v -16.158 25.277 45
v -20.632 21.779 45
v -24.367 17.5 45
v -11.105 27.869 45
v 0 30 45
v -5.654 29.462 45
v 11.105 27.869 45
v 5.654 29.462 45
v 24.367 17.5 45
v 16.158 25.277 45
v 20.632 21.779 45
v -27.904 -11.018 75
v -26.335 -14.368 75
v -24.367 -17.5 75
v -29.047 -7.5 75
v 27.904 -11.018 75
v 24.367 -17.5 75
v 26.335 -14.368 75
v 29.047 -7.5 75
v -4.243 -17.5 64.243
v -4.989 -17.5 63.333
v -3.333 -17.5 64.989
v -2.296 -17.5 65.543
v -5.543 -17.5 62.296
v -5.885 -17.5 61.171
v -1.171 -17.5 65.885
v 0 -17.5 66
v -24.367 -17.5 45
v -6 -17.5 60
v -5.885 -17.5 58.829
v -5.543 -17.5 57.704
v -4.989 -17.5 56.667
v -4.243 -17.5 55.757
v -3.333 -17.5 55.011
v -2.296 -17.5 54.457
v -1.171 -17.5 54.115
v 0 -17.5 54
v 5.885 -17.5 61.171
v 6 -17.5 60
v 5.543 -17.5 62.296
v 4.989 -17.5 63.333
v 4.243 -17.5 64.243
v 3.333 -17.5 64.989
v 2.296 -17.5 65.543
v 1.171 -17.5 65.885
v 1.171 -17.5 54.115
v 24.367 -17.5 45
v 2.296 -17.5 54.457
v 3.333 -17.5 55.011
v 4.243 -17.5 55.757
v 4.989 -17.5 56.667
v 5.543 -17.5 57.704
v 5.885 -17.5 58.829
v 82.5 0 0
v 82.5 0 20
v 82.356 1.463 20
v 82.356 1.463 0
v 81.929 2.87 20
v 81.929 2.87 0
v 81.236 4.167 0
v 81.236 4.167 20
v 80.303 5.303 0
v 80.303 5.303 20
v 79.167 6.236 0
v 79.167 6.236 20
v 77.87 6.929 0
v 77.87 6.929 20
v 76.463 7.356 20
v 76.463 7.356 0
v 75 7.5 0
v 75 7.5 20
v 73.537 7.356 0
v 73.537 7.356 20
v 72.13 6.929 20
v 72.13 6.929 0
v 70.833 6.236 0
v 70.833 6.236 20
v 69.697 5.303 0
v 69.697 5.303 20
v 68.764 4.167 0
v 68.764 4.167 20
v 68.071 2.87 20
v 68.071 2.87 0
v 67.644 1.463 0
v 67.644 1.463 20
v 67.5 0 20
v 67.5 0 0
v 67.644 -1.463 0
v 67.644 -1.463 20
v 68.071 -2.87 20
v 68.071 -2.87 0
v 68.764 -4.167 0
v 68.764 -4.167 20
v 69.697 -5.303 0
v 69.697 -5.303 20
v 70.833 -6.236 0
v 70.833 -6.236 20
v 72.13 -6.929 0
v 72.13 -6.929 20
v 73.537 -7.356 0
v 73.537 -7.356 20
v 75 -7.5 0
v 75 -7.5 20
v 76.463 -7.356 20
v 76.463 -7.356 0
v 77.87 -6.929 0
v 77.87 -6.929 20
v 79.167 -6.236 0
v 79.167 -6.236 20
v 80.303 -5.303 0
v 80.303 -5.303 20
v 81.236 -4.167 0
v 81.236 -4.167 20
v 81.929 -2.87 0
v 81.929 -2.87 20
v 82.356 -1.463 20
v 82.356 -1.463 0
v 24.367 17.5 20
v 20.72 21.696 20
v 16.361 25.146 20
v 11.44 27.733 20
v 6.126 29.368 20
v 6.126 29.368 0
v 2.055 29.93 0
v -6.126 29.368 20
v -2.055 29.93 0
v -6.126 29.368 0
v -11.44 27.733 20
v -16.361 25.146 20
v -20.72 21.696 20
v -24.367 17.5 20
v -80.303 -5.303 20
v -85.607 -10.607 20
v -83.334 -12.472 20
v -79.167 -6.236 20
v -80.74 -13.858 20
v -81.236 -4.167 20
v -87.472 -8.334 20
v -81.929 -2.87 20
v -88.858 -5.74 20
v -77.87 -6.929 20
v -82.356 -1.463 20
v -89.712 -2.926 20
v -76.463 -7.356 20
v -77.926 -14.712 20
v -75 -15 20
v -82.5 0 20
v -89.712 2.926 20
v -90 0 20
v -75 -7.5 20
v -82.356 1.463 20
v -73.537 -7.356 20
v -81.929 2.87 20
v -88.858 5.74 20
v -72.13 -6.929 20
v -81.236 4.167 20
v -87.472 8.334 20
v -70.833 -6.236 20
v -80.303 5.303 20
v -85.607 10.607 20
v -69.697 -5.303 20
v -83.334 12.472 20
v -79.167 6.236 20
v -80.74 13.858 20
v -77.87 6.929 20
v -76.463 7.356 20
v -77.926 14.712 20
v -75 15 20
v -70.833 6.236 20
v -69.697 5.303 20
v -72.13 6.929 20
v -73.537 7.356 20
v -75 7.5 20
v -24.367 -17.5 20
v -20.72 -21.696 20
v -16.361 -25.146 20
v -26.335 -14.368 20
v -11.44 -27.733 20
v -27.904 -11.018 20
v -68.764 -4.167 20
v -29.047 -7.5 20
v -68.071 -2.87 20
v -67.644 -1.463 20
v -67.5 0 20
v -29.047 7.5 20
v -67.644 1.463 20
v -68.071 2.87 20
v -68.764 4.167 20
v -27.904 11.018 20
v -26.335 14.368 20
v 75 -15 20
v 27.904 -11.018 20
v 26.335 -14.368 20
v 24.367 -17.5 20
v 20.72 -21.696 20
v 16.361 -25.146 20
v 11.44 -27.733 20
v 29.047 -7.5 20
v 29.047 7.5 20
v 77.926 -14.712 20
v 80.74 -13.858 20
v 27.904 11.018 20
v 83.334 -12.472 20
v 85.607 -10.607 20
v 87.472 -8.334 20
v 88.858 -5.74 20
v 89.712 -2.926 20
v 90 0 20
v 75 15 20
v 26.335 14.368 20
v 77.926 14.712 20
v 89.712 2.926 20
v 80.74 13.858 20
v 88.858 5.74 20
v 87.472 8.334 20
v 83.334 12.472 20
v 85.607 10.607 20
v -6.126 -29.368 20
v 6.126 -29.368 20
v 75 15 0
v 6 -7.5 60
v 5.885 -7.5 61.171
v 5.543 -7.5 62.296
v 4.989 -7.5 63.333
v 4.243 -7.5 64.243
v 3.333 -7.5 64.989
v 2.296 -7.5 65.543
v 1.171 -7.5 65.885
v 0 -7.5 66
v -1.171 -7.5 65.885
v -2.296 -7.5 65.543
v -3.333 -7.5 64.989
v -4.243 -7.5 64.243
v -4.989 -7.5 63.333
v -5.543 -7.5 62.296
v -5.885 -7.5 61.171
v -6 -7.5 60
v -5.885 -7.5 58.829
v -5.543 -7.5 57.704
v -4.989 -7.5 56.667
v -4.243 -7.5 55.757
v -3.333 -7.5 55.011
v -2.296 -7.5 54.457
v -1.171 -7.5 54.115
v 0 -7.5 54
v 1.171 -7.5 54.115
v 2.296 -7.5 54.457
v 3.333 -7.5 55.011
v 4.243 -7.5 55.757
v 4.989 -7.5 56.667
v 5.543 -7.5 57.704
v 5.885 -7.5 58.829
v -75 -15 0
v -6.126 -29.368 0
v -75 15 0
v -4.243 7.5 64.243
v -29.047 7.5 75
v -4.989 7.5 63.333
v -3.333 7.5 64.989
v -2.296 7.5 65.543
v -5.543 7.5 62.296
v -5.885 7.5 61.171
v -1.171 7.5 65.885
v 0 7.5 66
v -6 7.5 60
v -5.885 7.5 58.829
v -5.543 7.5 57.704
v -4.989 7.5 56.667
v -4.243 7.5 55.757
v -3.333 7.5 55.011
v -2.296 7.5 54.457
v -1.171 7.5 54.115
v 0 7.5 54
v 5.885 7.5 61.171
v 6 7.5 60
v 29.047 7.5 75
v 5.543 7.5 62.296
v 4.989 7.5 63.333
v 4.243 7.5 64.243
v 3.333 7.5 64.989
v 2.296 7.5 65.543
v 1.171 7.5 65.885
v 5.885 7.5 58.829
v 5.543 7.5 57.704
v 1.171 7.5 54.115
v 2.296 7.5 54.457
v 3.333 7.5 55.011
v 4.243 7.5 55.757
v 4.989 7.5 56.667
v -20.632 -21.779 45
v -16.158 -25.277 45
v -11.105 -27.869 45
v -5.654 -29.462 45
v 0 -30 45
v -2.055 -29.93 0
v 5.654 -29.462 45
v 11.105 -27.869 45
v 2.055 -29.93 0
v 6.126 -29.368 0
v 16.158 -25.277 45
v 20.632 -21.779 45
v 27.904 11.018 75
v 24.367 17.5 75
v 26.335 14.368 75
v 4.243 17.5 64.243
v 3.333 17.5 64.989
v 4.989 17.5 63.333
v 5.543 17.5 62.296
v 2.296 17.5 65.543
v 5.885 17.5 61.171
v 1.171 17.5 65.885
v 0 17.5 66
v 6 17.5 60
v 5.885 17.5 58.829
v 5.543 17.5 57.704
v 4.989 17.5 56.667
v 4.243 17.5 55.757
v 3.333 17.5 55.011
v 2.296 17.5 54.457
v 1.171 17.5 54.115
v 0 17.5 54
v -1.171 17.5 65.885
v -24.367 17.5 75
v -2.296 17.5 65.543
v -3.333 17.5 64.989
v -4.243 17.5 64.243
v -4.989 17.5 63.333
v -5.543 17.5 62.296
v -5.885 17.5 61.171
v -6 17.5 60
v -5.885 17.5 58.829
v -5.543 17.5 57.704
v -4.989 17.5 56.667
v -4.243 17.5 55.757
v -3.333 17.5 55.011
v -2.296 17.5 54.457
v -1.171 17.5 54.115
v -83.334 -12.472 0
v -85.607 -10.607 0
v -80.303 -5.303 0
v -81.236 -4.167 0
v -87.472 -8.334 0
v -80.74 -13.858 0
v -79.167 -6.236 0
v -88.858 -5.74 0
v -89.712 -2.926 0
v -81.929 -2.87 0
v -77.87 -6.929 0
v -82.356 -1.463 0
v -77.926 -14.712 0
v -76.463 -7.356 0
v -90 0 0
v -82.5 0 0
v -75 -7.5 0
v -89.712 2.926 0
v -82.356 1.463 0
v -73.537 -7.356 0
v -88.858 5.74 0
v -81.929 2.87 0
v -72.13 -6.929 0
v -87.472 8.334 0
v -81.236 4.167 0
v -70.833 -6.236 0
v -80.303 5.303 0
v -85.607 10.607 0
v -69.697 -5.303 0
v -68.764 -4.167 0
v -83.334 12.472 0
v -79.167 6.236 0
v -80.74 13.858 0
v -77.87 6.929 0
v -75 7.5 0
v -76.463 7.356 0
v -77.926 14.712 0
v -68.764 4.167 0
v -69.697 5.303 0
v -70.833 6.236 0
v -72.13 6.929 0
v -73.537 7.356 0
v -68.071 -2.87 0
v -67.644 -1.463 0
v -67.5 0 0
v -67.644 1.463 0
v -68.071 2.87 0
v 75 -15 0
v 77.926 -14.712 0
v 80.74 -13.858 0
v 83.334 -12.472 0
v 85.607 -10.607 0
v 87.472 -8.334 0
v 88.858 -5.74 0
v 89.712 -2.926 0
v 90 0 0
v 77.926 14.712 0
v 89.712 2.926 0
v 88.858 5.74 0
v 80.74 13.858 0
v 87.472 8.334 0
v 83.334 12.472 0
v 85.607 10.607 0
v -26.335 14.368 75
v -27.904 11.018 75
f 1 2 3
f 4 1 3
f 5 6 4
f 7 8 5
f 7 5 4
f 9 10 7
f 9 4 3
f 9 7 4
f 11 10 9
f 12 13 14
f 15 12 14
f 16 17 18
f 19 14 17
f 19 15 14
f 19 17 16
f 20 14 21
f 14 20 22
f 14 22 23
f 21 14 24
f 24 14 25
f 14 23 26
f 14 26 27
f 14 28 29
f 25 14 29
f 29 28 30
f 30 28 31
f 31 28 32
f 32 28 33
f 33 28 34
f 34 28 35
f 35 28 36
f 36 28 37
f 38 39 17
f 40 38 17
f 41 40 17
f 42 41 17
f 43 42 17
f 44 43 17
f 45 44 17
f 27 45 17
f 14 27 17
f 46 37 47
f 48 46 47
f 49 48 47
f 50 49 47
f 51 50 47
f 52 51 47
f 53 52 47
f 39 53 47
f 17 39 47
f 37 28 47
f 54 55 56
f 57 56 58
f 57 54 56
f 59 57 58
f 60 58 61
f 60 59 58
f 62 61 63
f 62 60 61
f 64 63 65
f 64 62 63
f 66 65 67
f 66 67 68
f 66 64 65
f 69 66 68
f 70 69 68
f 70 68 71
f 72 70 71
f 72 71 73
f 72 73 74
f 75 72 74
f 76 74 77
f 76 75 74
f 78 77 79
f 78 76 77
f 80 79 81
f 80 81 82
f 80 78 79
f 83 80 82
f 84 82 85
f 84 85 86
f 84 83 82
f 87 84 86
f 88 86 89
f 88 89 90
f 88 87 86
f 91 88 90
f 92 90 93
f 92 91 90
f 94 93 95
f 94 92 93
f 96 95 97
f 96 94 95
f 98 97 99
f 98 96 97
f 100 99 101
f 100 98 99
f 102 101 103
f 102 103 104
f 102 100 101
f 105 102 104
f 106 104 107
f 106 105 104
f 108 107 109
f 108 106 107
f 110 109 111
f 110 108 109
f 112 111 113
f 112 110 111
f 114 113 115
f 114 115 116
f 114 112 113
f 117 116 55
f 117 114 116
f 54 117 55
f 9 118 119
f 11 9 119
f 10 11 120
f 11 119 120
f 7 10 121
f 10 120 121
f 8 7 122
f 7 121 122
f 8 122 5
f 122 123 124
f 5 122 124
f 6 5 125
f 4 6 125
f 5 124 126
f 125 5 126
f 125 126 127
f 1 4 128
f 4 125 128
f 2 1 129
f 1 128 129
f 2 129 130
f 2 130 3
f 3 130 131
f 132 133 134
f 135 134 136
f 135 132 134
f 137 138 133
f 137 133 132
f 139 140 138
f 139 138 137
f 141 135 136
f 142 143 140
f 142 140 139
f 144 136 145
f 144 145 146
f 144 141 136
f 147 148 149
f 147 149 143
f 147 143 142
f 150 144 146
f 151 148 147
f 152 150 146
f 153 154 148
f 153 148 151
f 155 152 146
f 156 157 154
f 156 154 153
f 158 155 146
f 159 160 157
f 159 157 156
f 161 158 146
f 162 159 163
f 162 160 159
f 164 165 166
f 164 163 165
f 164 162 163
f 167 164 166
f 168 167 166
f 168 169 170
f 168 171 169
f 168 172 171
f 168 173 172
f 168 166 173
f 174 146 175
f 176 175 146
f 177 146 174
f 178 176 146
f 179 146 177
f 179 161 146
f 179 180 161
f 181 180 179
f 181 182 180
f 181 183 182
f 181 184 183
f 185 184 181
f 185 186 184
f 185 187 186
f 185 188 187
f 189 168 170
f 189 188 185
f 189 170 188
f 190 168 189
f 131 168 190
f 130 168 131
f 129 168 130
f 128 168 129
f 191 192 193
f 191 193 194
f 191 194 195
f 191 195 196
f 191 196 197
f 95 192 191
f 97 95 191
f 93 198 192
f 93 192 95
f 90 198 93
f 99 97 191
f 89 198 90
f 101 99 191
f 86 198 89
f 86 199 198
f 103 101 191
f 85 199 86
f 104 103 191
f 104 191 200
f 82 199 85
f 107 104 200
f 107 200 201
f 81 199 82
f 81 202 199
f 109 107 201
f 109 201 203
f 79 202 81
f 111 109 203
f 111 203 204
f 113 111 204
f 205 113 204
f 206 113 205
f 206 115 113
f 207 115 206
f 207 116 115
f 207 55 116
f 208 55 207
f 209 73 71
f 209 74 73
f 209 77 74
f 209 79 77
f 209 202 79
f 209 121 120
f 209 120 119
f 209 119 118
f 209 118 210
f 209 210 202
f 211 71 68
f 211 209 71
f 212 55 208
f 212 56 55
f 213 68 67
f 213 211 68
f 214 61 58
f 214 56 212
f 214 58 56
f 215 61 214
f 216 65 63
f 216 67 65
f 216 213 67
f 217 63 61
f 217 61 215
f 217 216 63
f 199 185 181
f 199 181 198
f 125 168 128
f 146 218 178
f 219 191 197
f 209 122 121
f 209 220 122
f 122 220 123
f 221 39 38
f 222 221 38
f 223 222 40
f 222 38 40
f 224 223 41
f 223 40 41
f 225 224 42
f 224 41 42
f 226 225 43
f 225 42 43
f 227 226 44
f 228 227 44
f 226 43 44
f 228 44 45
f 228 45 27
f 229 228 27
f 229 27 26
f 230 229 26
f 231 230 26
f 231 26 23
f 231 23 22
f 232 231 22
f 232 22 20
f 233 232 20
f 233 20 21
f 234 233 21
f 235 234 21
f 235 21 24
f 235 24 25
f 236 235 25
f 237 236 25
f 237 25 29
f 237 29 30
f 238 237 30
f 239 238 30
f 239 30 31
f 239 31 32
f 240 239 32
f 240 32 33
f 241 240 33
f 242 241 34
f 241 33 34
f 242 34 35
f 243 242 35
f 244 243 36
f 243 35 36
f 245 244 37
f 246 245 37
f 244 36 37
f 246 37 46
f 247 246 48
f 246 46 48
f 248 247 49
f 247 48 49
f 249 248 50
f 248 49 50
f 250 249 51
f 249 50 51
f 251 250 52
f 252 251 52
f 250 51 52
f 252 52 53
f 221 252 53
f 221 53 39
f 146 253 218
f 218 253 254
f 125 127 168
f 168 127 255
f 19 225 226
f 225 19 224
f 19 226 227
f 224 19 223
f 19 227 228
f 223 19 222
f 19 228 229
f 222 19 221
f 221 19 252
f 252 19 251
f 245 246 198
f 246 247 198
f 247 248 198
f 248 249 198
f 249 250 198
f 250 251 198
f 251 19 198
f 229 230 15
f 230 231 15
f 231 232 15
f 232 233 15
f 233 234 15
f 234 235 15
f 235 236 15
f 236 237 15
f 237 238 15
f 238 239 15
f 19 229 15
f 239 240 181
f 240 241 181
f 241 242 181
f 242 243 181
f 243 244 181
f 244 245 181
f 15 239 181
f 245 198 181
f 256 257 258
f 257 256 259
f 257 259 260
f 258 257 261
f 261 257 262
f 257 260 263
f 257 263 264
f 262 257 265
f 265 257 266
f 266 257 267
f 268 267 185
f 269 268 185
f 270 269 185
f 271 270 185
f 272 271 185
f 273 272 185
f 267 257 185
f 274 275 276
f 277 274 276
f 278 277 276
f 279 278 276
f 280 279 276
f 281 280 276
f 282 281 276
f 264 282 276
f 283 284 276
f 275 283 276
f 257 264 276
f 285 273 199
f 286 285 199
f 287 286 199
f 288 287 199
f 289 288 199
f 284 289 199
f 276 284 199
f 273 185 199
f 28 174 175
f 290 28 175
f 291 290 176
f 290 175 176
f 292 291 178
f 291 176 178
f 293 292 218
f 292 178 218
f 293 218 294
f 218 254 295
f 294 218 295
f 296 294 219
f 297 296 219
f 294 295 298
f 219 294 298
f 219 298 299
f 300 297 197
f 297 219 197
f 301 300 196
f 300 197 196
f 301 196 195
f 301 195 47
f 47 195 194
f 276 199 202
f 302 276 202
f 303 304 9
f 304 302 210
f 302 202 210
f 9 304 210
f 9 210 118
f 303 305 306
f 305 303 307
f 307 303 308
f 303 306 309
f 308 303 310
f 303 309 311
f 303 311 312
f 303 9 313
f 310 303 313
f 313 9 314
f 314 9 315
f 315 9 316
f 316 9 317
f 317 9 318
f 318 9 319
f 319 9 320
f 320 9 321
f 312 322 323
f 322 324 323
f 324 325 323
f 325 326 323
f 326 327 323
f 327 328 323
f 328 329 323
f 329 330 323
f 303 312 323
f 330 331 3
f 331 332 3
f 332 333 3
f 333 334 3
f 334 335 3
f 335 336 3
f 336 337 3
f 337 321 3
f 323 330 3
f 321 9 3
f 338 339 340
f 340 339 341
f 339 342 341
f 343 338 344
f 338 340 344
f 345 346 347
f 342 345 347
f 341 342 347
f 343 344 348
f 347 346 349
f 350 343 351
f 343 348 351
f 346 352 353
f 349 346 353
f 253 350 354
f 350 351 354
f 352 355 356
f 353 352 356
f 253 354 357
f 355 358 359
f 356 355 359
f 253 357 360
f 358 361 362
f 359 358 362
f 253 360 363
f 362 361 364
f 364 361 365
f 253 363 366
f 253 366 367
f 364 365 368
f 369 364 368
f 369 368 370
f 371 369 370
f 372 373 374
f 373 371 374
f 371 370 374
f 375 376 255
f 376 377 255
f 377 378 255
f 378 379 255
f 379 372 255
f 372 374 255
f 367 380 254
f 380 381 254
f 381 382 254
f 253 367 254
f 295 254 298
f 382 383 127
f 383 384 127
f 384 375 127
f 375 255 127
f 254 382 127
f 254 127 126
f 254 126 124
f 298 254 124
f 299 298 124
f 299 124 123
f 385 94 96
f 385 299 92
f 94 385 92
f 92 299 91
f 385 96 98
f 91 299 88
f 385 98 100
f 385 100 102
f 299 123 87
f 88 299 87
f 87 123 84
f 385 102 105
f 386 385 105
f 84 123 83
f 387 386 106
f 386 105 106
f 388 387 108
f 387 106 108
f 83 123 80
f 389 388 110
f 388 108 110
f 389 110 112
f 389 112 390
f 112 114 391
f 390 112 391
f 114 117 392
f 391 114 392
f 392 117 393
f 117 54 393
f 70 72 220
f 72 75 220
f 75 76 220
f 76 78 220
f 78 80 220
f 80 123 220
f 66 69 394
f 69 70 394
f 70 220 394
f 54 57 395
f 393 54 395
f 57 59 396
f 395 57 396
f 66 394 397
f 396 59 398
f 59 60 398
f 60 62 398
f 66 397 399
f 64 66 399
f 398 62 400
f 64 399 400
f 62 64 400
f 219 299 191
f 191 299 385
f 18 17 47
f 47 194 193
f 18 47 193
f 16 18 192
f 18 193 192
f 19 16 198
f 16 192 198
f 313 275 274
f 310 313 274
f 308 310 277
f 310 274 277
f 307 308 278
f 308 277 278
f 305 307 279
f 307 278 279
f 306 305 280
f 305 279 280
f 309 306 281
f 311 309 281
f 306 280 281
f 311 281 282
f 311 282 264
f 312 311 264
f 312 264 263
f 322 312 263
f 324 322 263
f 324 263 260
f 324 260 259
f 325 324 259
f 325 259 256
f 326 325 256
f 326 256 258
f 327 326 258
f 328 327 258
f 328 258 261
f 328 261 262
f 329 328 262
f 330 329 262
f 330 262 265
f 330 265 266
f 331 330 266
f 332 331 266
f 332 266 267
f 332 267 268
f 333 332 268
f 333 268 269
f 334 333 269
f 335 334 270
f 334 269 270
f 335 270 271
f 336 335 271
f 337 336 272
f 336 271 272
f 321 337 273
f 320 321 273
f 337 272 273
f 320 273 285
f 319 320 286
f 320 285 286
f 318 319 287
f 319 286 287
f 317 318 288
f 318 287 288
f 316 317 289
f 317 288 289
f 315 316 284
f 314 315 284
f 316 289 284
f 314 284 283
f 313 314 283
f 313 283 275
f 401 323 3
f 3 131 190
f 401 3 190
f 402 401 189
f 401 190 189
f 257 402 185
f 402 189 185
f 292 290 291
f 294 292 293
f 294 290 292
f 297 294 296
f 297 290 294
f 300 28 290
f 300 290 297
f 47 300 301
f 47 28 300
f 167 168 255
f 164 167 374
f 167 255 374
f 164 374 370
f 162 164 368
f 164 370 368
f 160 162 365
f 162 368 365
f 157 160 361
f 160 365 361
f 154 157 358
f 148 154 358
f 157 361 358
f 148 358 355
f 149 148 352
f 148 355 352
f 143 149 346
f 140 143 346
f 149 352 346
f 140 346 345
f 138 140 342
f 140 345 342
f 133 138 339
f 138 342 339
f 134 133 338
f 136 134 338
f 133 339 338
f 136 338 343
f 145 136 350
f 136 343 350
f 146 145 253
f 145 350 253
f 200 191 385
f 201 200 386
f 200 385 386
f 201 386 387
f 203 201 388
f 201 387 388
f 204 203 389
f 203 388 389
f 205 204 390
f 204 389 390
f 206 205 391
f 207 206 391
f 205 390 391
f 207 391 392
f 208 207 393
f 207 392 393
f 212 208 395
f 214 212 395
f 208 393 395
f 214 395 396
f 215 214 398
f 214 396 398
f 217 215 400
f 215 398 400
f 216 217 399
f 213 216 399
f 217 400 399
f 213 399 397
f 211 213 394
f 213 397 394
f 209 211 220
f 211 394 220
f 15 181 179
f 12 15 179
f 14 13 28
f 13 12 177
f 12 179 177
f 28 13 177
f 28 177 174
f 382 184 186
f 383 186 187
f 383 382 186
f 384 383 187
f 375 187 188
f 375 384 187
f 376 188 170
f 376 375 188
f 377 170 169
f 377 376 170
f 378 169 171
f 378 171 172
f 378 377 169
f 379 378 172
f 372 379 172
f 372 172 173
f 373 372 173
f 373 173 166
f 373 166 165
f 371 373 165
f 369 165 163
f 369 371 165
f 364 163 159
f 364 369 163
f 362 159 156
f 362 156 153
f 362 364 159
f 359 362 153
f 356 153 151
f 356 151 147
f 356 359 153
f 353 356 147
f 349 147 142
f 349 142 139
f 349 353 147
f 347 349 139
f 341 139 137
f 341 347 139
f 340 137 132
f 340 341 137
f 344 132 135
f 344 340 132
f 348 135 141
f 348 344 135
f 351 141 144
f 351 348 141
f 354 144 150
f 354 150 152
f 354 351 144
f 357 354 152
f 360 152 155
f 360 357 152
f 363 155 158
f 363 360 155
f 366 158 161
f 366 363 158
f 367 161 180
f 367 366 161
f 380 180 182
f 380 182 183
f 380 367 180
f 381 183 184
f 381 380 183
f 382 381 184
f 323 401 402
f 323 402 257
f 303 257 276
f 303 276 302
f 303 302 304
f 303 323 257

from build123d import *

# Parameters (mm, degrees)
CROQUIS1_R              = 7.5
SALIENTE_EXTRUIR1_DEPTH = 20
SALIENTE_EXTRUIR2_DEPTH = 45
SALIENTE_EXTRUIR3_DEPTH = 75
CROQUIS2_R              = 6
CORTAR_EXTRUIR1_DEPTH   = 75


with BuildPart() as part:
    # Croquis1 → Saliente-Extruir1 (new body)
    with BuildSketch(Plane.XY):
        with BuildLine():
            Line((29.047375097, 7.5), (-29.047375097, 7.5))
            ThreePointArc((-29.047375097, 7.5), (-27.171188586, 12.717173855), (-24.366985862, 17.5))
            ThreePointArc((-24.366985862, 17.5), (-16.360726635, 25.146105543), (-6.126443354, 29.36778323))
            Line((-6.126443354, 29.36778323), (-75, 15))
            ThreePointArc((-75, 15), (-90, 0), (-75, -15))
            Line((-75, -15), (-6.126443354, -29.36778323))
            ThreePointArc((-6.126443354, -29.36778323), (-16.360726635, -25.146105543), (-24.366985862, -17.5))
            ThreePointArc((-24.366985862, -17.5), (-27.171188586, -12.717173855), (-29.047375097, -7.5))
            Line((-29.047375097, -7.5), (29.047375097, -7.5))
            ThreePointArc((29.047375097, -7.5), (27.171188586, -12.717173855), (24.366985862, -17.5))
            ThreePointArc((24.366985862, -17.5), (16.360726635, -25.146105543), (6.126443354, -29.36778323))
            Line((6.126443354, -29.36778323), (75, -15))
            ThreePointArc((75, -15), (90, 0), (75, 15))
            Line((75, 15), (6.126443354, 29.36778323))
            ThreePointArc((6.126443354, 29.36778323), (16.360726635, 25.146105543), (24.366985862, 17.5))
            ThreePointArc((24.366985862, 17.5), (27.171188586, 12.717173855), (29.047375097, 7.5))
        make_face()
        with Locations((-75, 0)):
            Circle(CROQUIS1_R, mode=Mode.SUBTRACT)
        with Locations((75, 0)):
            Circle(CROQUIS1_R, mode=Mode.SUBTRACT)
    extrude(amount=SALIENTE_EXTRUIR1_DEPTH)

    # Croquis1<3> → Saliente-Extruir2 (add)
    with BuildSketch(Plane.XY):
        with BuildLine():
            ThreePointArc((24.366985862, 17.5), (0, 30), (-24.366985862, 17.5))
            Line((-24.366985862, 17.5), (24.366985862, 17.5))
        make_face()
        with BuildLine():
            ThreePointArc((-24.366985862, -17.5), (0, -30), (24.366985862, -17.5))
            Line((24.366985862, -17.5), (-24.366985862, -17.5))
        make_face()
    extrude(amount=SALIENTE_EXTRUIR2_DEPTH)

    # Croquis1<4> → Saliente-Extruir3 (add)
    with BuildSketch(Plane.XY):
        with BuildLine():
            ThreePointArc((-24.366985862, 17.5), (-27.171188586, 12.717173855), (-29.047375097, 7.5))
            Line((-29.047375097, 7.5), (29.047375097, 7.5))
            ThreePointArc((29.047375097, 7.5), (27.171188586, 12.717173855), (24.366985862, 17.5))
            Line((24.366985862, 17.5), (-24.366985862, 17.5))
        make_face()
        with BuildLine():
            ThreePointArc((-29.047375097, -7.5), (-27.171188586, -12.717173855), (-24.366985862, -17.5))
            Line((-24.366985862, -17.5), (24.366985862, -17.5))
            ThreePointArc((24.366985862, -17.5), (27.171188586, -12.717173855), (29.047375097, -7.5))
            Line((29.047375097, -7.5), (-29.047375097, -7.5))
        make_face()
    extrude(amount=SALIENTE_EXTRUIR3_DEPTH)

    # Croquis2 → Cortar-Extruir1 (cut)
    with BuildSketch(Plane.XZ.offset(17.5)):
        with Locations((0, 60)):
            Circle(CROQUIS2_R)
    extrude(amount=-CORTAR_EXTRUIR1_DEPTH, mode=Mode.SUBTRACT)


solid = part.part
